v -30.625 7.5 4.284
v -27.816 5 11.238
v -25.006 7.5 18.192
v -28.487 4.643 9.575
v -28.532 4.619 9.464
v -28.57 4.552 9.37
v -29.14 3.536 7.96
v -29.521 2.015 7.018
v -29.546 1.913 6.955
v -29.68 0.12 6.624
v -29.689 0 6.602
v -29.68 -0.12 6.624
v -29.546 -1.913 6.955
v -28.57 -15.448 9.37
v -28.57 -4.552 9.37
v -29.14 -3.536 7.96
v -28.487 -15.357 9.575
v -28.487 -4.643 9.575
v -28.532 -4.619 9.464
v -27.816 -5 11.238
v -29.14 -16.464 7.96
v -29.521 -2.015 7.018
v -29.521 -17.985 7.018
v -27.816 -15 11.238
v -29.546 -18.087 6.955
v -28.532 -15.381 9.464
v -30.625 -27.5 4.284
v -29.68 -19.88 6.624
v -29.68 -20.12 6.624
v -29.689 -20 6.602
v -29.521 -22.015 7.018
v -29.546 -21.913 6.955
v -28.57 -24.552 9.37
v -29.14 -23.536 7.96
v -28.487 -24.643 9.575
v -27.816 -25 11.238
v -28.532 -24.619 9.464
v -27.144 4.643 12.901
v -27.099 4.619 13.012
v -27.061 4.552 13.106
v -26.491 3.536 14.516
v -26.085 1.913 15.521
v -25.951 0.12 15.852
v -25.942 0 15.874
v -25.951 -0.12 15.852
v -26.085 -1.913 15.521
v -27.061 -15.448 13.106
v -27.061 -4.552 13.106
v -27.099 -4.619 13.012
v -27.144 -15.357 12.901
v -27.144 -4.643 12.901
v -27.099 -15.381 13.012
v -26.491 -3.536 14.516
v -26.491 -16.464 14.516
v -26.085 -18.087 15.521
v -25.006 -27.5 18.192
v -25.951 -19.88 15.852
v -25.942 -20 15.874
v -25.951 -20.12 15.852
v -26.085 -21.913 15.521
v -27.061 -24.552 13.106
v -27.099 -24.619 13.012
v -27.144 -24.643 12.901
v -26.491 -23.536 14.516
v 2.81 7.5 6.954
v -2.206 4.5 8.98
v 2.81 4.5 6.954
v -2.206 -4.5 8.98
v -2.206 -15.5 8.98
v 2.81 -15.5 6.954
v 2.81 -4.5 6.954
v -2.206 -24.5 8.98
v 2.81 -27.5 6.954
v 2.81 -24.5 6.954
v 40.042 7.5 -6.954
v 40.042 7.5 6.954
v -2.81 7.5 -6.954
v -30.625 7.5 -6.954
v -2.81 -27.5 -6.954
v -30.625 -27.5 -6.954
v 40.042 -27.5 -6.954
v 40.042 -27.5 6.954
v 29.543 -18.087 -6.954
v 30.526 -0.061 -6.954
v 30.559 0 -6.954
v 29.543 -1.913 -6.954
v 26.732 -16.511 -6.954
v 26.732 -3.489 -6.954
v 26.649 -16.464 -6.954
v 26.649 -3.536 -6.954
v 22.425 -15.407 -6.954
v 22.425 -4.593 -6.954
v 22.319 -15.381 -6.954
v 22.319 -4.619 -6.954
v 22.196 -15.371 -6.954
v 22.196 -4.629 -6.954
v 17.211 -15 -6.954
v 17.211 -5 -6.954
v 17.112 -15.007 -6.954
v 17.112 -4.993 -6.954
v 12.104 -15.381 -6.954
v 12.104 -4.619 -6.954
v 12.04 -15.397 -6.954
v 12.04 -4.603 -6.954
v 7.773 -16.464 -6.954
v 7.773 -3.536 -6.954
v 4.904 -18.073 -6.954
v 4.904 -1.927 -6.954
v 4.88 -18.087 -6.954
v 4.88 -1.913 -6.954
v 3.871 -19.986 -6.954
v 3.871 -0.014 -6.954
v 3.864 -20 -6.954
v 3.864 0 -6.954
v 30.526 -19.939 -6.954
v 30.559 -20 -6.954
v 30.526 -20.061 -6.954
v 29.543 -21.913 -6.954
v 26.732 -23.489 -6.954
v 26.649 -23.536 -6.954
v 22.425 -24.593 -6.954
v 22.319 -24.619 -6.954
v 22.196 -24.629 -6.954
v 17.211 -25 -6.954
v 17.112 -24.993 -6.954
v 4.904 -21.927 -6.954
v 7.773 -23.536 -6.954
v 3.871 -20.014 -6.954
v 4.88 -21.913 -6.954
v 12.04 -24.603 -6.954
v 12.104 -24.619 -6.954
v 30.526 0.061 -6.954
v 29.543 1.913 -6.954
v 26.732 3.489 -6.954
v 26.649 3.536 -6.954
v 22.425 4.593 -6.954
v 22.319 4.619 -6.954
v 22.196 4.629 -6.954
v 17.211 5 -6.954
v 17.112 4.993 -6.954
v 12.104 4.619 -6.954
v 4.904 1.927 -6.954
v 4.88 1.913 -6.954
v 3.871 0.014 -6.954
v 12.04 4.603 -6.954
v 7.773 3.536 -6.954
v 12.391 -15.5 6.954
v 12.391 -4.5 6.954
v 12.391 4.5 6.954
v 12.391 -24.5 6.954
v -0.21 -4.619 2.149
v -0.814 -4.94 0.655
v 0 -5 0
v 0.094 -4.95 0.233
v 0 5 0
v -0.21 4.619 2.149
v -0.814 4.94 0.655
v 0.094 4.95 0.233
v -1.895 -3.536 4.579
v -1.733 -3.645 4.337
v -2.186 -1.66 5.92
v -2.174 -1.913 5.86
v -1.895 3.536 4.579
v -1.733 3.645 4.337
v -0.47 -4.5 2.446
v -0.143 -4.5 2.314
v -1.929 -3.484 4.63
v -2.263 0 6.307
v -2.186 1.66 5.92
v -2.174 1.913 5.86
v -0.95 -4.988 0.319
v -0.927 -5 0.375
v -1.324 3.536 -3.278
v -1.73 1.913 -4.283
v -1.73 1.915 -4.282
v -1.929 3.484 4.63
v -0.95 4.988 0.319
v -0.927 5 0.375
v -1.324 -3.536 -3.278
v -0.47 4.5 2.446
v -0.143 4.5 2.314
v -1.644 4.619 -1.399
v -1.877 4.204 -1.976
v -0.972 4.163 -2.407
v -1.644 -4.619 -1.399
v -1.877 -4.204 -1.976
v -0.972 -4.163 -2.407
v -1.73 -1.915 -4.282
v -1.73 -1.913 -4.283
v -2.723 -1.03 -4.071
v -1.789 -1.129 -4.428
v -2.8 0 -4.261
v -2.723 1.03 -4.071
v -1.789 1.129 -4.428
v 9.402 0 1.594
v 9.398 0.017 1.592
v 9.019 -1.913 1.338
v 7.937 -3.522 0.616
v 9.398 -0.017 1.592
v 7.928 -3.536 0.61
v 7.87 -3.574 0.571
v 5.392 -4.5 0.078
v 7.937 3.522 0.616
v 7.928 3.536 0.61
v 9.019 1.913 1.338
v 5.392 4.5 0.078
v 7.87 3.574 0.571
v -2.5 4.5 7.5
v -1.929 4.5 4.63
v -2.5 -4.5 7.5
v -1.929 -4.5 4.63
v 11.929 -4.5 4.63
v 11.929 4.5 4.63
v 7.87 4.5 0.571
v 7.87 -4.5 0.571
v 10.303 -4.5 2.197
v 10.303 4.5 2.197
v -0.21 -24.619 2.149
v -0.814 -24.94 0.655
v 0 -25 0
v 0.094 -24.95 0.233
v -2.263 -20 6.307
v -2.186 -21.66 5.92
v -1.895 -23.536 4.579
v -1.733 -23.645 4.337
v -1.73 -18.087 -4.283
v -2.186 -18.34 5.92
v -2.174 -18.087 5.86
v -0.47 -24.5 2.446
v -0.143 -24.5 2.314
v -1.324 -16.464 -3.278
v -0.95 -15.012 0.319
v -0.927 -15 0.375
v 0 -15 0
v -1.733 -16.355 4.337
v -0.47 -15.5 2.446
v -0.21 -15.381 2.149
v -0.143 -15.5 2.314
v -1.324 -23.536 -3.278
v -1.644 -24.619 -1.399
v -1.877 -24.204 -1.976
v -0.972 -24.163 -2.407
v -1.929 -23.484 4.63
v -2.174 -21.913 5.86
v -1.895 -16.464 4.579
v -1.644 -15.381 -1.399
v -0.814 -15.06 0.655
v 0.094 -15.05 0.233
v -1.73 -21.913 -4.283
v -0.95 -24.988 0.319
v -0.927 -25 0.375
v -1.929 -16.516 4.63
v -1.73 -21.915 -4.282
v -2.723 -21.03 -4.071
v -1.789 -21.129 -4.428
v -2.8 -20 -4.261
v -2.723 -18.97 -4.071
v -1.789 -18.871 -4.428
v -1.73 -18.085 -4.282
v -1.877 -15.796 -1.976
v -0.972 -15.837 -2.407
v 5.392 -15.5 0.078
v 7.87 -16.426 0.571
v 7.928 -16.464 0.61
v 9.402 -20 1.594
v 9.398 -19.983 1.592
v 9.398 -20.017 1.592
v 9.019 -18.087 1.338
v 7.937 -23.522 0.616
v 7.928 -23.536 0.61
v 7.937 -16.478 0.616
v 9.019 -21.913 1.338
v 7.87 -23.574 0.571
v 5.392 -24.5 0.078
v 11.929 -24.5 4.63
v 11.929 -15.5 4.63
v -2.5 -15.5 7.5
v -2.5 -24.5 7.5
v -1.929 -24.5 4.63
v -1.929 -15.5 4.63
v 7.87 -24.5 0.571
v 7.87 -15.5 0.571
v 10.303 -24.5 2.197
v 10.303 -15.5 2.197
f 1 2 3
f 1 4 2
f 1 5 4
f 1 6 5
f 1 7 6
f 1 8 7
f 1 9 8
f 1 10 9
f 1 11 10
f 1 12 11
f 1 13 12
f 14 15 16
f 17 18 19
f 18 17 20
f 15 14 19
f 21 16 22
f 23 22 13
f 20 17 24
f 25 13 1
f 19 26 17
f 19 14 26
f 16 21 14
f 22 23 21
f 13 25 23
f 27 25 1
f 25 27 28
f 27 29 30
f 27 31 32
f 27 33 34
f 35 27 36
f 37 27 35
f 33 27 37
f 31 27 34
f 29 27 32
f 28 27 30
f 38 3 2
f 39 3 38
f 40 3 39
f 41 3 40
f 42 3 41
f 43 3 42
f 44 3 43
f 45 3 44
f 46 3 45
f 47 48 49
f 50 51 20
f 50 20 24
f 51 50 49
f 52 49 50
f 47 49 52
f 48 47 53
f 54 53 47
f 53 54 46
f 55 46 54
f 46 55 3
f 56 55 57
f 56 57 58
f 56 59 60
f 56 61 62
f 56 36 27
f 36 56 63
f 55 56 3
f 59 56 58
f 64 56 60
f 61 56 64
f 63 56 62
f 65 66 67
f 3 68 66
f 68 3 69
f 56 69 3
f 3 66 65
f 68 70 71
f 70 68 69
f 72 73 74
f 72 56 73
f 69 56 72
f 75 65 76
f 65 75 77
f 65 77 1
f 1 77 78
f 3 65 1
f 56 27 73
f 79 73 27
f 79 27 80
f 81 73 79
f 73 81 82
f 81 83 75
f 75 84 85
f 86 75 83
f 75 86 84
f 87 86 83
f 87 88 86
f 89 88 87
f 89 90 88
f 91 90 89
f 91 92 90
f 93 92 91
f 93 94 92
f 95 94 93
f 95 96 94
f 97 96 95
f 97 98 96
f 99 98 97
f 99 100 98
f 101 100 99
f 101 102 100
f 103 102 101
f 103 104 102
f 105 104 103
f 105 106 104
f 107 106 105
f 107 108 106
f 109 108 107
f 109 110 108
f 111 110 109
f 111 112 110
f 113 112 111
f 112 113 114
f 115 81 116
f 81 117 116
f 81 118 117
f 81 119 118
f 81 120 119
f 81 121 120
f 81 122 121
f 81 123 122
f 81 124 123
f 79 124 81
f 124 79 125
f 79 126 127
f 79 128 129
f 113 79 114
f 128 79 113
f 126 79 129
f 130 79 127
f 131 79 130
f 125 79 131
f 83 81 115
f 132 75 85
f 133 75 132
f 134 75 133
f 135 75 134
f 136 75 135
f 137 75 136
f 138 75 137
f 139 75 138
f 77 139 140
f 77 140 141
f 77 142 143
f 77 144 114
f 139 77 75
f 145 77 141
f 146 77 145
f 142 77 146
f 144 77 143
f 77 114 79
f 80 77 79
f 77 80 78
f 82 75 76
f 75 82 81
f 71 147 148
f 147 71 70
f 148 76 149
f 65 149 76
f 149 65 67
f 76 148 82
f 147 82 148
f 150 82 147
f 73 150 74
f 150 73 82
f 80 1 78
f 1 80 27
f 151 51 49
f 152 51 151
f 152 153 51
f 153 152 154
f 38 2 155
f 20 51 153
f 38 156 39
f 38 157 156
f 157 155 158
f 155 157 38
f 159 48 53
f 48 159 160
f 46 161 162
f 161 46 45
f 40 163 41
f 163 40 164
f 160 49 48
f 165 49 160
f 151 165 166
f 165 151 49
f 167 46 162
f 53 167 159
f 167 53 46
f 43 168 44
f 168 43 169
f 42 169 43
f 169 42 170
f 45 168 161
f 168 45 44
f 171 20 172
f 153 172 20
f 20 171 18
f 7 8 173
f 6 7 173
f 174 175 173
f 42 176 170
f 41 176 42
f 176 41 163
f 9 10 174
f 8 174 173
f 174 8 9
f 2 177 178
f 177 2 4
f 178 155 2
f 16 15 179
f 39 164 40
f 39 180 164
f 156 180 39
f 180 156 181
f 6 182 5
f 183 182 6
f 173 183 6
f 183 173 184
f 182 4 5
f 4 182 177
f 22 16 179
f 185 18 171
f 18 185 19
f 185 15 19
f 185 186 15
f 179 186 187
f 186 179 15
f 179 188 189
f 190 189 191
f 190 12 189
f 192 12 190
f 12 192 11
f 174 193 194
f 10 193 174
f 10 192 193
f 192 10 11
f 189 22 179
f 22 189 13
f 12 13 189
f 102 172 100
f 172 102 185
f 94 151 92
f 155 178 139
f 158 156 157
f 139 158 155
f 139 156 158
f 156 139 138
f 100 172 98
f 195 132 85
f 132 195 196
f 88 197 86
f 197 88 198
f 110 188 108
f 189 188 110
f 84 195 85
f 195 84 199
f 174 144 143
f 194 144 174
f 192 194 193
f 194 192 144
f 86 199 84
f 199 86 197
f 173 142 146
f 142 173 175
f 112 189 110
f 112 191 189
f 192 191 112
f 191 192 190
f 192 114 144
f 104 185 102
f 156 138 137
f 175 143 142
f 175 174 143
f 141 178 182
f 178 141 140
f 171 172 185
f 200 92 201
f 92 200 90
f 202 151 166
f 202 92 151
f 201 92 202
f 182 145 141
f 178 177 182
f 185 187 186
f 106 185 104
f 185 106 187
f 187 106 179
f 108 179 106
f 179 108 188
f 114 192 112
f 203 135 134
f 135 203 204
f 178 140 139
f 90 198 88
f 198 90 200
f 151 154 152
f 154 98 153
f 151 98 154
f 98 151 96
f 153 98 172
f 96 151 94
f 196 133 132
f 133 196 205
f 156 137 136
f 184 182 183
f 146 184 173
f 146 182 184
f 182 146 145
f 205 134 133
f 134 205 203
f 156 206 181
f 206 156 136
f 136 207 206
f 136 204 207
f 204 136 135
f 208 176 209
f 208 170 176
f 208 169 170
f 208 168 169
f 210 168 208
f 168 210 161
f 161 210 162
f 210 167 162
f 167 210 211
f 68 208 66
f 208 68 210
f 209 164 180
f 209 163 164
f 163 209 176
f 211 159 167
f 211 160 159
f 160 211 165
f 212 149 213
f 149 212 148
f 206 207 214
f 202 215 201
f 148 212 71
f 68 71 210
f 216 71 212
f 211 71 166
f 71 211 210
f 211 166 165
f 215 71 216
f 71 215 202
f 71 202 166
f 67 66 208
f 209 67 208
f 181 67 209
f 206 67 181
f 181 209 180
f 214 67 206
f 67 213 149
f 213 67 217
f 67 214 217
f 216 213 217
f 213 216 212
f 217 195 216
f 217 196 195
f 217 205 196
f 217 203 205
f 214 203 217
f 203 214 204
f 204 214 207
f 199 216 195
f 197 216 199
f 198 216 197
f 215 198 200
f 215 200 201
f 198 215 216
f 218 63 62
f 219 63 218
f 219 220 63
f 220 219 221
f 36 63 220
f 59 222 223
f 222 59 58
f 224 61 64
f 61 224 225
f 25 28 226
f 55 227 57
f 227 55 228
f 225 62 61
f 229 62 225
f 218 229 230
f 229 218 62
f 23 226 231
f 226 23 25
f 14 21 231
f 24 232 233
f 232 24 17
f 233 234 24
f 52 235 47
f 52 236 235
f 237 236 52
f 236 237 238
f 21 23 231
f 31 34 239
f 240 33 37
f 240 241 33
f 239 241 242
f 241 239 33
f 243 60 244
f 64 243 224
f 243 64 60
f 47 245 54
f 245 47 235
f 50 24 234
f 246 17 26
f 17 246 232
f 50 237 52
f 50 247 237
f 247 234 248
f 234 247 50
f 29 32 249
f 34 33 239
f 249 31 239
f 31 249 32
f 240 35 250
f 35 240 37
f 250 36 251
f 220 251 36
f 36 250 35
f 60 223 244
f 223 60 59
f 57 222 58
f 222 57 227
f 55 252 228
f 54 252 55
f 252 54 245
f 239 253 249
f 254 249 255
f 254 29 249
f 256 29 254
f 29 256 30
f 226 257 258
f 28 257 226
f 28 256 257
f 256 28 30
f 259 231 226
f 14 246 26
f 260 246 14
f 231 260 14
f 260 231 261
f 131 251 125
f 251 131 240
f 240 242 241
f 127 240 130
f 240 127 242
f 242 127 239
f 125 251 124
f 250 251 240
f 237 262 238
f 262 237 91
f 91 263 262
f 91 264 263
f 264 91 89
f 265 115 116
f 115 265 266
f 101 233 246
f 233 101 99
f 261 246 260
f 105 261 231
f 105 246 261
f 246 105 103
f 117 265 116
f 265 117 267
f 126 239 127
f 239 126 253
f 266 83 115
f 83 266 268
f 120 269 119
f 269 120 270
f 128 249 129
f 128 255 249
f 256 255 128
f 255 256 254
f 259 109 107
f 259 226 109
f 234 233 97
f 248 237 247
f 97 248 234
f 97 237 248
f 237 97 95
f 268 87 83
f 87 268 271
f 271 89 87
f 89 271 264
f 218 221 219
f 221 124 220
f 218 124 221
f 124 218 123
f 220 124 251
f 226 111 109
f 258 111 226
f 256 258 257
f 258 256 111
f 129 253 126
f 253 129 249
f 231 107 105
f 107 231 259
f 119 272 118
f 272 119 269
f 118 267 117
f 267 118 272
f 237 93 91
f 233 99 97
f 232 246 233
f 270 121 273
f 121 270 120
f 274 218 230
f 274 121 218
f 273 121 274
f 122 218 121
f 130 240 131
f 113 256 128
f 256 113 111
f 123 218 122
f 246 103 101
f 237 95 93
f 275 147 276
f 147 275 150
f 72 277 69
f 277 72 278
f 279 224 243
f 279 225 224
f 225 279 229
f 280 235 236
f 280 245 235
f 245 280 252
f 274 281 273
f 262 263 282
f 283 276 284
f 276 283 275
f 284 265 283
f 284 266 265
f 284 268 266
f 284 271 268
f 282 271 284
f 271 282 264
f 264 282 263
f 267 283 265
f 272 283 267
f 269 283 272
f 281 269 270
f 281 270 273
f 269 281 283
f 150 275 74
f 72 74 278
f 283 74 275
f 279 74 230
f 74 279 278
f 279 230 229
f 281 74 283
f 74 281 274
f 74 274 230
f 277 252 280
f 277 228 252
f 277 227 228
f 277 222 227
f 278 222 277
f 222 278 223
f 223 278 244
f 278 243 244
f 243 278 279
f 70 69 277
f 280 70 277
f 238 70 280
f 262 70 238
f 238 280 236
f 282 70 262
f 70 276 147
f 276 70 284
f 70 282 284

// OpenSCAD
/* * * * * * * * * * * * * * * * * * * * * * * * * * * * * * * * * * * * * * * *\
|* Parameterized Pocket Hole Jig                                               *|
|* Created By:  Corey Abate (@SpoonlessCorey)                                  *|
|* Last updated: 13APR2016                                                     *|
|*                                                                             *| 
|* This work is licensed under:                                                *|
|* Creative Commons Attribution-ShareAlike 4.0 International License           *|
|*                                                                             *|
|* To view a copy of this license, visit                                       *|
|* http://creativecommons.org/licenses/by-sa/4.0/.                             *|
|*                                                                             *| 
\* * * * * * * * * * * * * * * * * * * * * * * * * * * * * * * * * * * * * * * */

//Tweakables
//================================================

//Hole angle in degrees
holeAngle     = 22;

//Hole diameter in mm
holeSize      = 10;

//Hole depth in mm
holeDepth     = 30;

//Number of holes
numberOfHoles = 2;

//Center-to-center hole spacing
holeSpacing   = 20;   //mm (center to center)

//thickness around holes as a percent of holeSize
edgeSpacing   = 25;



//Some math and stuff
//================================================
edge         = edgeSpacing/100;
width        = (numberOfHoles - 1)*holeSpacing + holeSize + 2*edge*holeSize;
offsetWidth  = -edge*holeSize - holeSize/2;
guideHeight  = (1+2*edge)*holeSize;
baseHeight   = holeDepth*sin(holeAngle)-guideHeight*cos(holeAngle)/2;
baseLength   = guideHeight*sin(holeAngle) + holeDepth*cos(holeAngle)-((guideHeight/2)*sin(holeAngle)); 
baseOffsetV  = -guideHeight*cos(holeAngle)/2;
gripLength   = guideHeight/sin(holeAngle);
gripHeight   = guideHeight*cos(holeAngle);

//Creating the parts
//================================================
rotate([0,0,180])
difference(){
 

    //Block Geometry
    union(){

        //Guide Geometry
        rotate([90-holeAngle,0,90])
            translate([offsetWidth, offsetWidth, 0])
                cube([width,guideHeight,holeDepth]);
 
        //Base Geometry
        rotate([270,0,0])
            translate([0,0,offsetWidth])       
                linear_extrude(height = width)
                    polygon( points=[[0,-gripHeight/2],
                                    [baseLength,-baseHeight],
                                    [baseLength,-baseOffsetV],
                                    [-gripLength,-baseOffsetV],
                                    [-gripLength,-gripHeight/2]] );

    }

    //Hole Geometry
    for( i = [0: numberOfHoles-1]){

        rotate([90-holeAngle ,0,90])
            translate([i*holeSpacing,0,0])
                cylinder(r=holeSize/2,h=holeDepth+2 ,$fn=16);

        rotate([270-holeAngle ,0,90])
            translate([i*holeSpacing,0,-1])
                cylinder(r=holeSize/2,h=1000 ,$fn=16);
        
        translate([-holeSize/2,i*holeSpacing,holeSize*3/4])
            rotate([90,0,0])
                cylinder(r=holeSize*3/4,h=holeSize*0.9 ,$fn=16, center = true);

    }

   

}

